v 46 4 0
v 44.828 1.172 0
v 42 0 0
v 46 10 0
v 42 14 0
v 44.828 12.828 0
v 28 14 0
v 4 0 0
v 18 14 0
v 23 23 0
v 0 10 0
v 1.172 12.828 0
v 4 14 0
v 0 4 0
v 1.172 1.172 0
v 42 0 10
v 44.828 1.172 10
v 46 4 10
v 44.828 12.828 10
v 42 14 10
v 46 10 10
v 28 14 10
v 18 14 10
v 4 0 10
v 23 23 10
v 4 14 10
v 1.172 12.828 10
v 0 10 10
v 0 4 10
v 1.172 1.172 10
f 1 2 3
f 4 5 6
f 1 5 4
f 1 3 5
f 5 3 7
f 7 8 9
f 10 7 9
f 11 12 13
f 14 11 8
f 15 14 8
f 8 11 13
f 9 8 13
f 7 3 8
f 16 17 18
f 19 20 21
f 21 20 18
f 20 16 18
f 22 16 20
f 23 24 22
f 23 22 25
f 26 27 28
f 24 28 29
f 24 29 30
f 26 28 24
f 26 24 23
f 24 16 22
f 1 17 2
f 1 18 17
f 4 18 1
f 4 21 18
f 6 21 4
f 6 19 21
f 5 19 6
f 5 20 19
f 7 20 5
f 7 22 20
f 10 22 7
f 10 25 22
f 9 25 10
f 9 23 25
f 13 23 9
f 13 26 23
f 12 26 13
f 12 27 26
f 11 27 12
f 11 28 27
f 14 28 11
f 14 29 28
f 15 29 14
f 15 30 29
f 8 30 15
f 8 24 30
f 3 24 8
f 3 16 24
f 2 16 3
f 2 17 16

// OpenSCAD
$fn = 32;

// ----------------------------------------------------------------------
// Ratchet pawl: 46 x 14 mm body, beak 9 mm сверху
// ----------------------------------------------------------------------

// --- parameters (mm) ---
profile_height = 10;      // extrusion height
profile_points = 15;      // points of the closed outline

profile = [[0, 4], [1.172, 1.172], [4, 0], [42, 0], [44.828, 1.172], [46, 4], [46, 10], [44.828, 12.828], [42, 14], [28, 14], [23, 23], [18, 14], [4, 14], [1.172, 12.828], [0, 10]];  // single closed polygon, 15 points, counter clockwise

// --- the one profile operation ---
linear_extrude(height = profile_height) polygon(points = profile);
